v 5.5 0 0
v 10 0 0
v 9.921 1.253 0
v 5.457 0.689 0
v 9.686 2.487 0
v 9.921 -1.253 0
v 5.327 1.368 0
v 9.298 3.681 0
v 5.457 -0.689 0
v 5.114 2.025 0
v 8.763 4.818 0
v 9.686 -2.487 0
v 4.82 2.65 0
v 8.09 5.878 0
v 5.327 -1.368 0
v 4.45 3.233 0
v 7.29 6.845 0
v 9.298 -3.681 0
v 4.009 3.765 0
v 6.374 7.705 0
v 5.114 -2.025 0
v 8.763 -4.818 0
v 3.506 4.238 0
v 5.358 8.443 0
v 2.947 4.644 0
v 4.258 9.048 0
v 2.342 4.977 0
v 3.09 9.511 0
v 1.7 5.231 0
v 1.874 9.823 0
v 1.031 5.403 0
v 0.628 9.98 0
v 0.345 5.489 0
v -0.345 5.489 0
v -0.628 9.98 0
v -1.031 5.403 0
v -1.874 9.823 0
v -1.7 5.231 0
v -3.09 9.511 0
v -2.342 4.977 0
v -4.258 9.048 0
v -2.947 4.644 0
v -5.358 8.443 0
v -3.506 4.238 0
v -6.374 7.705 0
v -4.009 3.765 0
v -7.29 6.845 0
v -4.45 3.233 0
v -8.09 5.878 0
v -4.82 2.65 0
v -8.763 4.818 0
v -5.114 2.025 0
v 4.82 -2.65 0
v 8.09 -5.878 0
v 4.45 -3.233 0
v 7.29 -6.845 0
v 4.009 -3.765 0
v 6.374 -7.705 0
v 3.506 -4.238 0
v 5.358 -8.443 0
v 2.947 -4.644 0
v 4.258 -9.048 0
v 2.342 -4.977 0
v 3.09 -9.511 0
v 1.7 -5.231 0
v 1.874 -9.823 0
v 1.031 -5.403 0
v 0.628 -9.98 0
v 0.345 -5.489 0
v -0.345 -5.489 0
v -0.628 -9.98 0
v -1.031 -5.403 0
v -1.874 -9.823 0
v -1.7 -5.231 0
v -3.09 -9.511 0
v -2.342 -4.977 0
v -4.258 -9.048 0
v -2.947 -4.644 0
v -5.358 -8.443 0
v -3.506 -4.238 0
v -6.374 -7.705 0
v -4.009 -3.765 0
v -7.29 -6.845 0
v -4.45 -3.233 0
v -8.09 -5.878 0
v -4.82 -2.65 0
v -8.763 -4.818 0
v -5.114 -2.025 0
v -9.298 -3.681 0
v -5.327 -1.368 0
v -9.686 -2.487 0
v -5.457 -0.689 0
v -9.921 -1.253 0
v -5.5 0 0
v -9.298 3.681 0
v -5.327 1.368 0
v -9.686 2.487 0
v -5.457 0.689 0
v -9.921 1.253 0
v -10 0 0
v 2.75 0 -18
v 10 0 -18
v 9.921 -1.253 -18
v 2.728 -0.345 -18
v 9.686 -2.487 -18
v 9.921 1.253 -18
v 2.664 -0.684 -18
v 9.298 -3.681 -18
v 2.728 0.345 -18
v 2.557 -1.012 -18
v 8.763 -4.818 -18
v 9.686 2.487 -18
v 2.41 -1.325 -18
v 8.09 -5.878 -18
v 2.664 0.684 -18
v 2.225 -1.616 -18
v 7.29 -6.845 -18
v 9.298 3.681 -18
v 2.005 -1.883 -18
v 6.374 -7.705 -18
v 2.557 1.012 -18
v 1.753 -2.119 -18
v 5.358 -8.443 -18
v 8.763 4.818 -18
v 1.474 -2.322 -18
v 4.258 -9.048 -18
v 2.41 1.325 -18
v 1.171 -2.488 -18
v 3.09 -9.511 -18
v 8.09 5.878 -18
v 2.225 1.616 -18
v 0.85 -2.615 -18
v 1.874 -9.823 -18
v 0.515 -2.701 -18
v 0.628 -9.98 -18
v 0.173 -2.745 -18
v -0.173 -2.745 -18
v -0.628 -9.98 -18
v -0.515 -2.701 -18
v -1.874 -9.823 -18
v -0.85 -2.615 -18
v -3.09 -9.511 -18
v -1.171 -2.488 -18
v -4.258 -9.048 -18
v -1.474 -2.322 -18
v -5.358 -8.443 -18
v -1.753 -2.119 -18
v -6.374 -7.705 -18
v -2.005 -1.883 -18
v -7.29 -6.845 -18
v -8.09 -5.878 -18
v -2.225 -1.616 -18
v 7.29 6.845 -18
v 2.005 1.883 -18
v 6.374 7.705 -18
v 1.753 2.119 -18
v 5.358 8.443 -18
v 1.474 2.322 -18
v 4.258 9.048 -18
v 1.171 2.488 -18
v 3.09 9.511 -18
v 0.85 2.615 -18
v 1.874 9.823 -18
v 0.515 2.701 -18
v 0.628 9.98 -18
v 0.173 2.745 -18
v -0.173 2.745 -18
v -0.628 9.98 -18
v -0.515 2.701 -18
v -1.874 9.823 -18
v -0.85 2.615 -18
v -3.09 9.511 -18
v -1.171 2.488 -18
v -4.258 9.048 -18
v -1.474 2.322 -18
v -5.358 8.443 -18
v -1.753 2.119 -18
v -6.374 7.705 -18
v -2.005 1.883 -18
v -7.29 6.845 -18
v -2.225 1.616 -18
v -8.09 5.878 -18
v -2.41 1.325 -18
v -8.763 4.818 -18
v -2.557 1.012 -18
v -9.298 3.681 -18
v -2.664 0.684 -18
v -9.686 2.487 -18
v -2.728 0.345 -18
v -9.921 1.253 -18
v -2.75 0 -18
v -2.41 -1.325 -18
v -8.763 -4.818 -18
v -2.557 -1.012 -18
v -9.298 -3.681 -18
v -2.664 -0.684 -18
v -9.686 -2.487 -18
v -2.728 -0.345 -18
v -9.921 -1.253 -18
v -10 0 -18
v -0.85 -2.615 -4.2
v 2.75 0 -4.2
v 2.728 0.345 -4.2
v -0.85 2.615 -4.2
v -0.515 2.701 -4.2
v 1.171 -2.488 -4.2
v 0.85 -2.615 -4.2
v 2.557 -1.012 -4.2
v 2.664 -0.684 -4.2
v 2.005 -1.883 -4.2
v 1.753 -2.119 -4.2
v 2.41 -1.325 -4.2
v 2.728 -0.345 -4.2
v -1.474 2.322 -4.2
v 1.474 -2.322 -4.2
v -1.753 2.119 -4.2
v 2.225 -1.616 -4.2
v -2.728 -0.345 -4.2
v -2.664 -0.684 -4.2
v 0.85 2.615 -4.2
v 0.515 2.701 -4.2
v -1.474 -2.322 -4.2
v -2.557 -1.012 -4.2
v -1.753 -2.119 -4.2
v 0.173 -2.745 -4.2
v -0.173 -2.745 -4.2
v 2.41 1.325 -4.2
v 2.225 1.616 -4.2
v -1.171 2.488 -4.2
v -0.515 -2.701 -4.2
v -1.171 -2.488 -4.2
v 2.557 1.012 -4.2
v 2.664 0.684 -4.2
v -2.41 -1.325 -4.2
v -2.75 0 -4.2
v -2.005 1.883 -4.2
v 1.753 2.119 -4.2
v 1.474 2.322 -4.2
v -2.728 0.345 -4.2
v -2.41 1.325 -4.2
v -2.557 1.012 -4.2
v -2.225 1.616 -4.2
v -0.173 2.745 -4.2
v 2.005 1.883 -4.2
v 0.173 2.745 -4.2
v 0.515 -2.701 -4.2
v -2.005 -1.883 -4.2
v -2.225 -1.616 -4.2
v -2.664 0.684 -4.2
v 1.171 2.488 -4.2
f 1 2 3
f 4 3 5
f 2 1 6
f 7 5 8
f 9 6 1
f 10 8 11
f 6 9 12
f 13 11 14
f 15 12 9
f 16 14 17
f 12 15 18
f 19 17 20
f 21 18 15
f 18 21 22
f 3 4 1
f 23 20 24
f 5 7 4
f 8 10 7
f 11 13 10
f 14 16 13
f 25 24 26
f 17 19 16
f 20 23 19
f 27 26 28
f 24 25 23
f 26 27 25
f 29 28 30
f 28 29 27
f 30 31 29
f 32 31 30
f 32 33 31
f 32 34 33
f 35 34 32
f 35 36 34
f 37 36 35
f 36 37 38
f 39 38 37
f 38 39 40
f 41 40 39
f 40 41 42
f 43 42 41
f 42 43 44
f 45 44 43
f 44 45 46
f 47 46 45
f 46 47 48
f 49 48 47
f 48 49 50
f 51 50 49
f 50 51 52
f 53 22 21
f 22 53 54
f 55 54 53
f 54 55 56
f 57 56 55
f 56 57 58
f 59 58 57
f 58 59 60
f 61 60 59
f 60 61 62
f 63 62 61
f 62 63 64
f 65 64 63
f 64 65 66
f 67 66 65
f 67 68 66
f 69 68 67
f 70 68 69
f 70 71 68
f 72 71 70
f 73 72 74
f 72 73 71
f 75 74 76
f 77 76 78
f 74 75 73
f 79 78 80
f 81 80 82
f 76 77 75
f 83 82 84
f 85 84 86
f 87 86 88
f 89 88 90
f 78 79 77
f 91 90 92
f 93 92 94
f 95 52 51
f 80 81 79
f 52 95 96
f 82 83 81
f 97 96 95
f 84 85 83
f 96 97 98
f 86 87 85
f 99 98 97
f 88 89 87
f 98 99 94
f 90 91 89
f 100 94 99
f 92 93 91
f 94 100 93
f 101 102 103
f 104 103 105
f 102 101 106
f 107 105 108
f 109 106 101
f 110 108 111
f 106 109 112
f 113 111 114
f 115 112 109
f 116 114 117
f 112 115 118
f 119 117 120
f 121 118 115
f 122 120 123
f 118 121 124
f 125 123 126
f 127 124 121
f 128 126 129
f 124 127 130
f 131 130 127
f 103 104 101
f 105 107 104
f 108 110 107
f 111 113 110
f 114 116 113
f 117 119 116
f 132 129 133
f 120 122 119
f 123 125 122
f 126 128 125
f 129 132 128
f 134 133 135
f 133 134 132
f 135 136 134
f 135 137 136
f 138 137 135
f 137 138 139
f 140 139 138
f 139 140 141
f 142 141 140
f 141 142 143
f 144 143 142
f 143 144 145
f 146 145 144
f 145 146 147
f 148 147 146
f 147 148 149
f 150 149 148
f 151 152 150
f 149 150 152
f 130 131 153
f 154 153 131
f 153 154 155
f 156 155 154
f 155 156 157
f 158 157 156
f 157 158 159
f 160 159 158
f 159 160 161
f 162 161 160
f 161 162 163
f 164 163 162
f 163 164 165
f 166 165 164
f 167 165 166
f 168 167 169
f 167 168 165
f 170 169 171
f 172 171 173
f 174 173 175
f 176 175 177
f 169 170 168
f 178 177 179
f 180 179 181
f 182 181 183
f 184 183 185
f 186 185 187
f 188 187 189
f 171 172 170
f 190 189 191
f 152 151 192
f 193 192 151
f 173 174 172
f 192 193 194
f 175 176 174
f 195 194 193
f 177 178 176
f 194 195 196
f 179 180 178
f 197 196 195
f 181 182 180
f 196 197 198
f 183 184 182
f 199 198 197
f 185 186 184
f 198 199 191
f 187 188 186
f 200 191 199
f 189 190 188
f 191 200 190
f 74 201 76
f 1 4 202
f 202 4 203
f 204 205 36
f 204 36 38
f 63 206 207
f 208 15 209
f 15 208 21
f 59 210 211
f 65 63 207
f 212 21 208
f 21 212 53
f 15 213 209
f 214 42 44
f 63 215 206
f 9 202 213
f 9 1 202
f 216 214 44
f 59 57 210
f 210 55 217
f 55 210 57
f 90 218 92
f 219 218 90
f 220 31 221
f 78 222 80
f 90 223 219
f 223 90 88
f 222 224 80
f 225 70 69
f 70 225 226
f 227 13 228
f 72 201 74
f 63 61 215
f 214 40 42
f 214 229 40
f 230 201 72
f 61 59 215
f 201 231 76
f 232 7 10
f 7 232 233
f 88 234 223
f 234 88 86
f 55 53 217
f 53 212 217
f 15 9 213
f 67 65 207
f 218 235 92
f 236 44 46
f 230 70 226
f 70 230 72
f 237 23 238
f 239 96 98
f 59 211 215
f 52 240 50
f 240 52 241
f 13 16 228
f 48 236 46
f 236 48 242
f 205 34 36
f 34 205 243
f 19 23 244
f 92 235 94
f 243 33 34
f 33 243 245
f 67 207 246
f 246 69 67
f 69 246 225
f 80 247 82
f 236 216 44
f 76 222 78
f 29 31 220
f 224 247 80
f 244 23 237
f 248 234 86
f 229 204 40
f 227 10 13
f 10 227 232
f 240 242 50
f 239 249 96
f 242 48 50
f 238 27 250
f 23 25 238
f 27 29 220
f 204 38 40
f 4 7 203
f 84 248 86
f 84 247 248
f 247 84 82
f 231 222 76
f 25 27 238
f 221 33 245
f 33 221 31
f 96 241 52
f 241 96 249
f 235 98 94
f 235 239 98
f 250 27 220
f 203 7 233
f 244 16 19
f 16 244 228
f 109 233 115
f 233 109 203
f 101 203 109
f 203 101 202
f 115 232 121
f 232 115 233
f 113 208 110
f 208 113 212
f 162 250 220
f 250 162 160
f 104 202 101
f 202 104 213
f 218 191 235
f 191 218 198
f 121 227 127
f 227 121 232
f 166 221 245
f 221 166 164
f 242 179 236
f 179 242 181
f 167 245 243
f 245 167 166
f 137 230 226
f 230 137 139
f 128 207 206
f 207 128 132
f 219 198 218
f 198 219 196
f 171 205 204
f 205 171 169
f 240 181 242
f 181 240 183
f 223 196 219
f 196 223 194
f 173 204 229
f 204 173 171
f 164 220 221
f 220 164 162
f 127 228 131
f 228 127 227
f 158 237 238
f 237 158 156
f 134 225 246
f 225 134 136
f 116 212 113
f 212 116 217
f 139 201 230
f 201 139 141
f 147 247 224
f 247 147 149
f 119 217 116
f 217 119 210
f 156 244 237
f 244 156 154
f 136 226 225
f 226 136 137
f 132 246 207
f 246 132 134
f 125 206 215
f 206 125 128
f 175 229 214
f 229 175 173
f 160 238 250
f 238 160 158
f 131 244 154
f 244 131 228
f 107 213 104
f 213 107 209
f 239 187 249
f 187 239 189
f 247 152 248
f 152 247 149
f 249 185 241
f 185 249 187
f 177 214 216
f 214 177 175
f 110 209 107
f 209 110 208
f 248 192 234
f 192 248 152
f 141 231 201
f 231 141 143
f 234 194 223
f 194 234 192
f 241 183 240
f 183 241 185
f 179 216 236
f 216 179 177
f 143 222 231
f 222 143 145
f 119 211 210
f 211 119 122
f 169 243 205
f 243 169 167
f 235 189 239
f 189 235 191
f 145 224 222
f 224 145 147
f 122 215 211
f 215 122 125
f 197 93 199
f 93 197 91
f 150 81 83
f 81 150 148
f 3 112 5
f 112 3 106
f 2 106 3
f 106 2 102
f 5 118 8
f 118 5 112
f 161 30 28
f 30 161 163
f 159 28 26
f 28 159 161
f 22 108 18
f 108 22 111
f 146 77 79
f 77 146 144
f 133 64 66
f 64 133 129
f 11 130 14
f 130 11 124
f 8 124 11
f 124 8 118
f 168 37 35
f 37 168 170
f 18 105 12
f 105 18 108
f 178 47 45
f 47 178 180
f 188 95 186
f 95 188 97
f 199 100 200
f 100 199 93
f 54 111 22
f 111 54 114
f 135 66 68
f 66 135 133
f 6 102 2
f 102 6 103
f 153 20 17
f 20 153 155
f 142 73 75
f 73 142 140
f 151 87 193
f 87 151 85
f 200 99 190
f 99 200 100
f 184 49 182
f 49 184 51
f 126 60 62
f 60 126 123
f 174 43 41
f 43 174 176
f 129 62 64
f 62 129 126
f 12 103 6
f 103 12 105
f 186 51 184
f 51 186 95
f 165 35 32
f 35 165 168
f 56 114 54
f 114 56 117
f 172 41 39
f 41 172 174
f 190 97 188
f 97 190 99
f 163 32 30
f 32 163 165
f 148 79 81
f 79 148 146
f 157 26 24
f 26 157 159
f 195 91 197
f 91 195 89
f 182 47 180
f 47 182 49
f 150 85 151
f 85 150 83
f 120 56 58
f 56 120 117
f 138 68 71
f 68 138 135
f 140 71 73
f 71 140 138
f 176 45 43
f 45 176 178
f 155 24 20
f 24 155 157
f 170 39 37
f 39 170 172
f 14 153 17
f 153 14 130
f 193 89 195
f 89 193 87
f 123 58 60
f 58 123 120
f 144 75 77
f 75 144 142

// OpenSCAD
$fn = 50;


difference() {
	union() {
		translate(v = [0, 0, -18.0000000000]) {
			cylinder(h = 18, r = 10.0000000000);
		}
		cylinder(h = 0, r = 20.0000000000);
	}
	union() {
		translate(v = [0, 0, 0]) {
			rotate(a = [0, 0, 0]) {
				difference() {
					union() {
						#translate(v = [0, 0, -18.0000000000]) {
							cylinder(h = 18, r = 2.2500000000);
						}
						#translate(v = [0, 0, -4.2000000000]) {
							cylinder(h = 4.2000000000, r = 10.0000000000, r1 = 2.7500000000, r2 = 5.5000000000);
						}
						#translate(v = [0, 0, -18.0000000000]) {
							cylinder(h = 18, r = 2.7500000000);
						}
						#translate(v = [0, 0, -18.0000000000]) {
							cylinder(h = 18, r = 2.2500000000);
						}
					}
					union();
				}
			}
		}
	}
}
